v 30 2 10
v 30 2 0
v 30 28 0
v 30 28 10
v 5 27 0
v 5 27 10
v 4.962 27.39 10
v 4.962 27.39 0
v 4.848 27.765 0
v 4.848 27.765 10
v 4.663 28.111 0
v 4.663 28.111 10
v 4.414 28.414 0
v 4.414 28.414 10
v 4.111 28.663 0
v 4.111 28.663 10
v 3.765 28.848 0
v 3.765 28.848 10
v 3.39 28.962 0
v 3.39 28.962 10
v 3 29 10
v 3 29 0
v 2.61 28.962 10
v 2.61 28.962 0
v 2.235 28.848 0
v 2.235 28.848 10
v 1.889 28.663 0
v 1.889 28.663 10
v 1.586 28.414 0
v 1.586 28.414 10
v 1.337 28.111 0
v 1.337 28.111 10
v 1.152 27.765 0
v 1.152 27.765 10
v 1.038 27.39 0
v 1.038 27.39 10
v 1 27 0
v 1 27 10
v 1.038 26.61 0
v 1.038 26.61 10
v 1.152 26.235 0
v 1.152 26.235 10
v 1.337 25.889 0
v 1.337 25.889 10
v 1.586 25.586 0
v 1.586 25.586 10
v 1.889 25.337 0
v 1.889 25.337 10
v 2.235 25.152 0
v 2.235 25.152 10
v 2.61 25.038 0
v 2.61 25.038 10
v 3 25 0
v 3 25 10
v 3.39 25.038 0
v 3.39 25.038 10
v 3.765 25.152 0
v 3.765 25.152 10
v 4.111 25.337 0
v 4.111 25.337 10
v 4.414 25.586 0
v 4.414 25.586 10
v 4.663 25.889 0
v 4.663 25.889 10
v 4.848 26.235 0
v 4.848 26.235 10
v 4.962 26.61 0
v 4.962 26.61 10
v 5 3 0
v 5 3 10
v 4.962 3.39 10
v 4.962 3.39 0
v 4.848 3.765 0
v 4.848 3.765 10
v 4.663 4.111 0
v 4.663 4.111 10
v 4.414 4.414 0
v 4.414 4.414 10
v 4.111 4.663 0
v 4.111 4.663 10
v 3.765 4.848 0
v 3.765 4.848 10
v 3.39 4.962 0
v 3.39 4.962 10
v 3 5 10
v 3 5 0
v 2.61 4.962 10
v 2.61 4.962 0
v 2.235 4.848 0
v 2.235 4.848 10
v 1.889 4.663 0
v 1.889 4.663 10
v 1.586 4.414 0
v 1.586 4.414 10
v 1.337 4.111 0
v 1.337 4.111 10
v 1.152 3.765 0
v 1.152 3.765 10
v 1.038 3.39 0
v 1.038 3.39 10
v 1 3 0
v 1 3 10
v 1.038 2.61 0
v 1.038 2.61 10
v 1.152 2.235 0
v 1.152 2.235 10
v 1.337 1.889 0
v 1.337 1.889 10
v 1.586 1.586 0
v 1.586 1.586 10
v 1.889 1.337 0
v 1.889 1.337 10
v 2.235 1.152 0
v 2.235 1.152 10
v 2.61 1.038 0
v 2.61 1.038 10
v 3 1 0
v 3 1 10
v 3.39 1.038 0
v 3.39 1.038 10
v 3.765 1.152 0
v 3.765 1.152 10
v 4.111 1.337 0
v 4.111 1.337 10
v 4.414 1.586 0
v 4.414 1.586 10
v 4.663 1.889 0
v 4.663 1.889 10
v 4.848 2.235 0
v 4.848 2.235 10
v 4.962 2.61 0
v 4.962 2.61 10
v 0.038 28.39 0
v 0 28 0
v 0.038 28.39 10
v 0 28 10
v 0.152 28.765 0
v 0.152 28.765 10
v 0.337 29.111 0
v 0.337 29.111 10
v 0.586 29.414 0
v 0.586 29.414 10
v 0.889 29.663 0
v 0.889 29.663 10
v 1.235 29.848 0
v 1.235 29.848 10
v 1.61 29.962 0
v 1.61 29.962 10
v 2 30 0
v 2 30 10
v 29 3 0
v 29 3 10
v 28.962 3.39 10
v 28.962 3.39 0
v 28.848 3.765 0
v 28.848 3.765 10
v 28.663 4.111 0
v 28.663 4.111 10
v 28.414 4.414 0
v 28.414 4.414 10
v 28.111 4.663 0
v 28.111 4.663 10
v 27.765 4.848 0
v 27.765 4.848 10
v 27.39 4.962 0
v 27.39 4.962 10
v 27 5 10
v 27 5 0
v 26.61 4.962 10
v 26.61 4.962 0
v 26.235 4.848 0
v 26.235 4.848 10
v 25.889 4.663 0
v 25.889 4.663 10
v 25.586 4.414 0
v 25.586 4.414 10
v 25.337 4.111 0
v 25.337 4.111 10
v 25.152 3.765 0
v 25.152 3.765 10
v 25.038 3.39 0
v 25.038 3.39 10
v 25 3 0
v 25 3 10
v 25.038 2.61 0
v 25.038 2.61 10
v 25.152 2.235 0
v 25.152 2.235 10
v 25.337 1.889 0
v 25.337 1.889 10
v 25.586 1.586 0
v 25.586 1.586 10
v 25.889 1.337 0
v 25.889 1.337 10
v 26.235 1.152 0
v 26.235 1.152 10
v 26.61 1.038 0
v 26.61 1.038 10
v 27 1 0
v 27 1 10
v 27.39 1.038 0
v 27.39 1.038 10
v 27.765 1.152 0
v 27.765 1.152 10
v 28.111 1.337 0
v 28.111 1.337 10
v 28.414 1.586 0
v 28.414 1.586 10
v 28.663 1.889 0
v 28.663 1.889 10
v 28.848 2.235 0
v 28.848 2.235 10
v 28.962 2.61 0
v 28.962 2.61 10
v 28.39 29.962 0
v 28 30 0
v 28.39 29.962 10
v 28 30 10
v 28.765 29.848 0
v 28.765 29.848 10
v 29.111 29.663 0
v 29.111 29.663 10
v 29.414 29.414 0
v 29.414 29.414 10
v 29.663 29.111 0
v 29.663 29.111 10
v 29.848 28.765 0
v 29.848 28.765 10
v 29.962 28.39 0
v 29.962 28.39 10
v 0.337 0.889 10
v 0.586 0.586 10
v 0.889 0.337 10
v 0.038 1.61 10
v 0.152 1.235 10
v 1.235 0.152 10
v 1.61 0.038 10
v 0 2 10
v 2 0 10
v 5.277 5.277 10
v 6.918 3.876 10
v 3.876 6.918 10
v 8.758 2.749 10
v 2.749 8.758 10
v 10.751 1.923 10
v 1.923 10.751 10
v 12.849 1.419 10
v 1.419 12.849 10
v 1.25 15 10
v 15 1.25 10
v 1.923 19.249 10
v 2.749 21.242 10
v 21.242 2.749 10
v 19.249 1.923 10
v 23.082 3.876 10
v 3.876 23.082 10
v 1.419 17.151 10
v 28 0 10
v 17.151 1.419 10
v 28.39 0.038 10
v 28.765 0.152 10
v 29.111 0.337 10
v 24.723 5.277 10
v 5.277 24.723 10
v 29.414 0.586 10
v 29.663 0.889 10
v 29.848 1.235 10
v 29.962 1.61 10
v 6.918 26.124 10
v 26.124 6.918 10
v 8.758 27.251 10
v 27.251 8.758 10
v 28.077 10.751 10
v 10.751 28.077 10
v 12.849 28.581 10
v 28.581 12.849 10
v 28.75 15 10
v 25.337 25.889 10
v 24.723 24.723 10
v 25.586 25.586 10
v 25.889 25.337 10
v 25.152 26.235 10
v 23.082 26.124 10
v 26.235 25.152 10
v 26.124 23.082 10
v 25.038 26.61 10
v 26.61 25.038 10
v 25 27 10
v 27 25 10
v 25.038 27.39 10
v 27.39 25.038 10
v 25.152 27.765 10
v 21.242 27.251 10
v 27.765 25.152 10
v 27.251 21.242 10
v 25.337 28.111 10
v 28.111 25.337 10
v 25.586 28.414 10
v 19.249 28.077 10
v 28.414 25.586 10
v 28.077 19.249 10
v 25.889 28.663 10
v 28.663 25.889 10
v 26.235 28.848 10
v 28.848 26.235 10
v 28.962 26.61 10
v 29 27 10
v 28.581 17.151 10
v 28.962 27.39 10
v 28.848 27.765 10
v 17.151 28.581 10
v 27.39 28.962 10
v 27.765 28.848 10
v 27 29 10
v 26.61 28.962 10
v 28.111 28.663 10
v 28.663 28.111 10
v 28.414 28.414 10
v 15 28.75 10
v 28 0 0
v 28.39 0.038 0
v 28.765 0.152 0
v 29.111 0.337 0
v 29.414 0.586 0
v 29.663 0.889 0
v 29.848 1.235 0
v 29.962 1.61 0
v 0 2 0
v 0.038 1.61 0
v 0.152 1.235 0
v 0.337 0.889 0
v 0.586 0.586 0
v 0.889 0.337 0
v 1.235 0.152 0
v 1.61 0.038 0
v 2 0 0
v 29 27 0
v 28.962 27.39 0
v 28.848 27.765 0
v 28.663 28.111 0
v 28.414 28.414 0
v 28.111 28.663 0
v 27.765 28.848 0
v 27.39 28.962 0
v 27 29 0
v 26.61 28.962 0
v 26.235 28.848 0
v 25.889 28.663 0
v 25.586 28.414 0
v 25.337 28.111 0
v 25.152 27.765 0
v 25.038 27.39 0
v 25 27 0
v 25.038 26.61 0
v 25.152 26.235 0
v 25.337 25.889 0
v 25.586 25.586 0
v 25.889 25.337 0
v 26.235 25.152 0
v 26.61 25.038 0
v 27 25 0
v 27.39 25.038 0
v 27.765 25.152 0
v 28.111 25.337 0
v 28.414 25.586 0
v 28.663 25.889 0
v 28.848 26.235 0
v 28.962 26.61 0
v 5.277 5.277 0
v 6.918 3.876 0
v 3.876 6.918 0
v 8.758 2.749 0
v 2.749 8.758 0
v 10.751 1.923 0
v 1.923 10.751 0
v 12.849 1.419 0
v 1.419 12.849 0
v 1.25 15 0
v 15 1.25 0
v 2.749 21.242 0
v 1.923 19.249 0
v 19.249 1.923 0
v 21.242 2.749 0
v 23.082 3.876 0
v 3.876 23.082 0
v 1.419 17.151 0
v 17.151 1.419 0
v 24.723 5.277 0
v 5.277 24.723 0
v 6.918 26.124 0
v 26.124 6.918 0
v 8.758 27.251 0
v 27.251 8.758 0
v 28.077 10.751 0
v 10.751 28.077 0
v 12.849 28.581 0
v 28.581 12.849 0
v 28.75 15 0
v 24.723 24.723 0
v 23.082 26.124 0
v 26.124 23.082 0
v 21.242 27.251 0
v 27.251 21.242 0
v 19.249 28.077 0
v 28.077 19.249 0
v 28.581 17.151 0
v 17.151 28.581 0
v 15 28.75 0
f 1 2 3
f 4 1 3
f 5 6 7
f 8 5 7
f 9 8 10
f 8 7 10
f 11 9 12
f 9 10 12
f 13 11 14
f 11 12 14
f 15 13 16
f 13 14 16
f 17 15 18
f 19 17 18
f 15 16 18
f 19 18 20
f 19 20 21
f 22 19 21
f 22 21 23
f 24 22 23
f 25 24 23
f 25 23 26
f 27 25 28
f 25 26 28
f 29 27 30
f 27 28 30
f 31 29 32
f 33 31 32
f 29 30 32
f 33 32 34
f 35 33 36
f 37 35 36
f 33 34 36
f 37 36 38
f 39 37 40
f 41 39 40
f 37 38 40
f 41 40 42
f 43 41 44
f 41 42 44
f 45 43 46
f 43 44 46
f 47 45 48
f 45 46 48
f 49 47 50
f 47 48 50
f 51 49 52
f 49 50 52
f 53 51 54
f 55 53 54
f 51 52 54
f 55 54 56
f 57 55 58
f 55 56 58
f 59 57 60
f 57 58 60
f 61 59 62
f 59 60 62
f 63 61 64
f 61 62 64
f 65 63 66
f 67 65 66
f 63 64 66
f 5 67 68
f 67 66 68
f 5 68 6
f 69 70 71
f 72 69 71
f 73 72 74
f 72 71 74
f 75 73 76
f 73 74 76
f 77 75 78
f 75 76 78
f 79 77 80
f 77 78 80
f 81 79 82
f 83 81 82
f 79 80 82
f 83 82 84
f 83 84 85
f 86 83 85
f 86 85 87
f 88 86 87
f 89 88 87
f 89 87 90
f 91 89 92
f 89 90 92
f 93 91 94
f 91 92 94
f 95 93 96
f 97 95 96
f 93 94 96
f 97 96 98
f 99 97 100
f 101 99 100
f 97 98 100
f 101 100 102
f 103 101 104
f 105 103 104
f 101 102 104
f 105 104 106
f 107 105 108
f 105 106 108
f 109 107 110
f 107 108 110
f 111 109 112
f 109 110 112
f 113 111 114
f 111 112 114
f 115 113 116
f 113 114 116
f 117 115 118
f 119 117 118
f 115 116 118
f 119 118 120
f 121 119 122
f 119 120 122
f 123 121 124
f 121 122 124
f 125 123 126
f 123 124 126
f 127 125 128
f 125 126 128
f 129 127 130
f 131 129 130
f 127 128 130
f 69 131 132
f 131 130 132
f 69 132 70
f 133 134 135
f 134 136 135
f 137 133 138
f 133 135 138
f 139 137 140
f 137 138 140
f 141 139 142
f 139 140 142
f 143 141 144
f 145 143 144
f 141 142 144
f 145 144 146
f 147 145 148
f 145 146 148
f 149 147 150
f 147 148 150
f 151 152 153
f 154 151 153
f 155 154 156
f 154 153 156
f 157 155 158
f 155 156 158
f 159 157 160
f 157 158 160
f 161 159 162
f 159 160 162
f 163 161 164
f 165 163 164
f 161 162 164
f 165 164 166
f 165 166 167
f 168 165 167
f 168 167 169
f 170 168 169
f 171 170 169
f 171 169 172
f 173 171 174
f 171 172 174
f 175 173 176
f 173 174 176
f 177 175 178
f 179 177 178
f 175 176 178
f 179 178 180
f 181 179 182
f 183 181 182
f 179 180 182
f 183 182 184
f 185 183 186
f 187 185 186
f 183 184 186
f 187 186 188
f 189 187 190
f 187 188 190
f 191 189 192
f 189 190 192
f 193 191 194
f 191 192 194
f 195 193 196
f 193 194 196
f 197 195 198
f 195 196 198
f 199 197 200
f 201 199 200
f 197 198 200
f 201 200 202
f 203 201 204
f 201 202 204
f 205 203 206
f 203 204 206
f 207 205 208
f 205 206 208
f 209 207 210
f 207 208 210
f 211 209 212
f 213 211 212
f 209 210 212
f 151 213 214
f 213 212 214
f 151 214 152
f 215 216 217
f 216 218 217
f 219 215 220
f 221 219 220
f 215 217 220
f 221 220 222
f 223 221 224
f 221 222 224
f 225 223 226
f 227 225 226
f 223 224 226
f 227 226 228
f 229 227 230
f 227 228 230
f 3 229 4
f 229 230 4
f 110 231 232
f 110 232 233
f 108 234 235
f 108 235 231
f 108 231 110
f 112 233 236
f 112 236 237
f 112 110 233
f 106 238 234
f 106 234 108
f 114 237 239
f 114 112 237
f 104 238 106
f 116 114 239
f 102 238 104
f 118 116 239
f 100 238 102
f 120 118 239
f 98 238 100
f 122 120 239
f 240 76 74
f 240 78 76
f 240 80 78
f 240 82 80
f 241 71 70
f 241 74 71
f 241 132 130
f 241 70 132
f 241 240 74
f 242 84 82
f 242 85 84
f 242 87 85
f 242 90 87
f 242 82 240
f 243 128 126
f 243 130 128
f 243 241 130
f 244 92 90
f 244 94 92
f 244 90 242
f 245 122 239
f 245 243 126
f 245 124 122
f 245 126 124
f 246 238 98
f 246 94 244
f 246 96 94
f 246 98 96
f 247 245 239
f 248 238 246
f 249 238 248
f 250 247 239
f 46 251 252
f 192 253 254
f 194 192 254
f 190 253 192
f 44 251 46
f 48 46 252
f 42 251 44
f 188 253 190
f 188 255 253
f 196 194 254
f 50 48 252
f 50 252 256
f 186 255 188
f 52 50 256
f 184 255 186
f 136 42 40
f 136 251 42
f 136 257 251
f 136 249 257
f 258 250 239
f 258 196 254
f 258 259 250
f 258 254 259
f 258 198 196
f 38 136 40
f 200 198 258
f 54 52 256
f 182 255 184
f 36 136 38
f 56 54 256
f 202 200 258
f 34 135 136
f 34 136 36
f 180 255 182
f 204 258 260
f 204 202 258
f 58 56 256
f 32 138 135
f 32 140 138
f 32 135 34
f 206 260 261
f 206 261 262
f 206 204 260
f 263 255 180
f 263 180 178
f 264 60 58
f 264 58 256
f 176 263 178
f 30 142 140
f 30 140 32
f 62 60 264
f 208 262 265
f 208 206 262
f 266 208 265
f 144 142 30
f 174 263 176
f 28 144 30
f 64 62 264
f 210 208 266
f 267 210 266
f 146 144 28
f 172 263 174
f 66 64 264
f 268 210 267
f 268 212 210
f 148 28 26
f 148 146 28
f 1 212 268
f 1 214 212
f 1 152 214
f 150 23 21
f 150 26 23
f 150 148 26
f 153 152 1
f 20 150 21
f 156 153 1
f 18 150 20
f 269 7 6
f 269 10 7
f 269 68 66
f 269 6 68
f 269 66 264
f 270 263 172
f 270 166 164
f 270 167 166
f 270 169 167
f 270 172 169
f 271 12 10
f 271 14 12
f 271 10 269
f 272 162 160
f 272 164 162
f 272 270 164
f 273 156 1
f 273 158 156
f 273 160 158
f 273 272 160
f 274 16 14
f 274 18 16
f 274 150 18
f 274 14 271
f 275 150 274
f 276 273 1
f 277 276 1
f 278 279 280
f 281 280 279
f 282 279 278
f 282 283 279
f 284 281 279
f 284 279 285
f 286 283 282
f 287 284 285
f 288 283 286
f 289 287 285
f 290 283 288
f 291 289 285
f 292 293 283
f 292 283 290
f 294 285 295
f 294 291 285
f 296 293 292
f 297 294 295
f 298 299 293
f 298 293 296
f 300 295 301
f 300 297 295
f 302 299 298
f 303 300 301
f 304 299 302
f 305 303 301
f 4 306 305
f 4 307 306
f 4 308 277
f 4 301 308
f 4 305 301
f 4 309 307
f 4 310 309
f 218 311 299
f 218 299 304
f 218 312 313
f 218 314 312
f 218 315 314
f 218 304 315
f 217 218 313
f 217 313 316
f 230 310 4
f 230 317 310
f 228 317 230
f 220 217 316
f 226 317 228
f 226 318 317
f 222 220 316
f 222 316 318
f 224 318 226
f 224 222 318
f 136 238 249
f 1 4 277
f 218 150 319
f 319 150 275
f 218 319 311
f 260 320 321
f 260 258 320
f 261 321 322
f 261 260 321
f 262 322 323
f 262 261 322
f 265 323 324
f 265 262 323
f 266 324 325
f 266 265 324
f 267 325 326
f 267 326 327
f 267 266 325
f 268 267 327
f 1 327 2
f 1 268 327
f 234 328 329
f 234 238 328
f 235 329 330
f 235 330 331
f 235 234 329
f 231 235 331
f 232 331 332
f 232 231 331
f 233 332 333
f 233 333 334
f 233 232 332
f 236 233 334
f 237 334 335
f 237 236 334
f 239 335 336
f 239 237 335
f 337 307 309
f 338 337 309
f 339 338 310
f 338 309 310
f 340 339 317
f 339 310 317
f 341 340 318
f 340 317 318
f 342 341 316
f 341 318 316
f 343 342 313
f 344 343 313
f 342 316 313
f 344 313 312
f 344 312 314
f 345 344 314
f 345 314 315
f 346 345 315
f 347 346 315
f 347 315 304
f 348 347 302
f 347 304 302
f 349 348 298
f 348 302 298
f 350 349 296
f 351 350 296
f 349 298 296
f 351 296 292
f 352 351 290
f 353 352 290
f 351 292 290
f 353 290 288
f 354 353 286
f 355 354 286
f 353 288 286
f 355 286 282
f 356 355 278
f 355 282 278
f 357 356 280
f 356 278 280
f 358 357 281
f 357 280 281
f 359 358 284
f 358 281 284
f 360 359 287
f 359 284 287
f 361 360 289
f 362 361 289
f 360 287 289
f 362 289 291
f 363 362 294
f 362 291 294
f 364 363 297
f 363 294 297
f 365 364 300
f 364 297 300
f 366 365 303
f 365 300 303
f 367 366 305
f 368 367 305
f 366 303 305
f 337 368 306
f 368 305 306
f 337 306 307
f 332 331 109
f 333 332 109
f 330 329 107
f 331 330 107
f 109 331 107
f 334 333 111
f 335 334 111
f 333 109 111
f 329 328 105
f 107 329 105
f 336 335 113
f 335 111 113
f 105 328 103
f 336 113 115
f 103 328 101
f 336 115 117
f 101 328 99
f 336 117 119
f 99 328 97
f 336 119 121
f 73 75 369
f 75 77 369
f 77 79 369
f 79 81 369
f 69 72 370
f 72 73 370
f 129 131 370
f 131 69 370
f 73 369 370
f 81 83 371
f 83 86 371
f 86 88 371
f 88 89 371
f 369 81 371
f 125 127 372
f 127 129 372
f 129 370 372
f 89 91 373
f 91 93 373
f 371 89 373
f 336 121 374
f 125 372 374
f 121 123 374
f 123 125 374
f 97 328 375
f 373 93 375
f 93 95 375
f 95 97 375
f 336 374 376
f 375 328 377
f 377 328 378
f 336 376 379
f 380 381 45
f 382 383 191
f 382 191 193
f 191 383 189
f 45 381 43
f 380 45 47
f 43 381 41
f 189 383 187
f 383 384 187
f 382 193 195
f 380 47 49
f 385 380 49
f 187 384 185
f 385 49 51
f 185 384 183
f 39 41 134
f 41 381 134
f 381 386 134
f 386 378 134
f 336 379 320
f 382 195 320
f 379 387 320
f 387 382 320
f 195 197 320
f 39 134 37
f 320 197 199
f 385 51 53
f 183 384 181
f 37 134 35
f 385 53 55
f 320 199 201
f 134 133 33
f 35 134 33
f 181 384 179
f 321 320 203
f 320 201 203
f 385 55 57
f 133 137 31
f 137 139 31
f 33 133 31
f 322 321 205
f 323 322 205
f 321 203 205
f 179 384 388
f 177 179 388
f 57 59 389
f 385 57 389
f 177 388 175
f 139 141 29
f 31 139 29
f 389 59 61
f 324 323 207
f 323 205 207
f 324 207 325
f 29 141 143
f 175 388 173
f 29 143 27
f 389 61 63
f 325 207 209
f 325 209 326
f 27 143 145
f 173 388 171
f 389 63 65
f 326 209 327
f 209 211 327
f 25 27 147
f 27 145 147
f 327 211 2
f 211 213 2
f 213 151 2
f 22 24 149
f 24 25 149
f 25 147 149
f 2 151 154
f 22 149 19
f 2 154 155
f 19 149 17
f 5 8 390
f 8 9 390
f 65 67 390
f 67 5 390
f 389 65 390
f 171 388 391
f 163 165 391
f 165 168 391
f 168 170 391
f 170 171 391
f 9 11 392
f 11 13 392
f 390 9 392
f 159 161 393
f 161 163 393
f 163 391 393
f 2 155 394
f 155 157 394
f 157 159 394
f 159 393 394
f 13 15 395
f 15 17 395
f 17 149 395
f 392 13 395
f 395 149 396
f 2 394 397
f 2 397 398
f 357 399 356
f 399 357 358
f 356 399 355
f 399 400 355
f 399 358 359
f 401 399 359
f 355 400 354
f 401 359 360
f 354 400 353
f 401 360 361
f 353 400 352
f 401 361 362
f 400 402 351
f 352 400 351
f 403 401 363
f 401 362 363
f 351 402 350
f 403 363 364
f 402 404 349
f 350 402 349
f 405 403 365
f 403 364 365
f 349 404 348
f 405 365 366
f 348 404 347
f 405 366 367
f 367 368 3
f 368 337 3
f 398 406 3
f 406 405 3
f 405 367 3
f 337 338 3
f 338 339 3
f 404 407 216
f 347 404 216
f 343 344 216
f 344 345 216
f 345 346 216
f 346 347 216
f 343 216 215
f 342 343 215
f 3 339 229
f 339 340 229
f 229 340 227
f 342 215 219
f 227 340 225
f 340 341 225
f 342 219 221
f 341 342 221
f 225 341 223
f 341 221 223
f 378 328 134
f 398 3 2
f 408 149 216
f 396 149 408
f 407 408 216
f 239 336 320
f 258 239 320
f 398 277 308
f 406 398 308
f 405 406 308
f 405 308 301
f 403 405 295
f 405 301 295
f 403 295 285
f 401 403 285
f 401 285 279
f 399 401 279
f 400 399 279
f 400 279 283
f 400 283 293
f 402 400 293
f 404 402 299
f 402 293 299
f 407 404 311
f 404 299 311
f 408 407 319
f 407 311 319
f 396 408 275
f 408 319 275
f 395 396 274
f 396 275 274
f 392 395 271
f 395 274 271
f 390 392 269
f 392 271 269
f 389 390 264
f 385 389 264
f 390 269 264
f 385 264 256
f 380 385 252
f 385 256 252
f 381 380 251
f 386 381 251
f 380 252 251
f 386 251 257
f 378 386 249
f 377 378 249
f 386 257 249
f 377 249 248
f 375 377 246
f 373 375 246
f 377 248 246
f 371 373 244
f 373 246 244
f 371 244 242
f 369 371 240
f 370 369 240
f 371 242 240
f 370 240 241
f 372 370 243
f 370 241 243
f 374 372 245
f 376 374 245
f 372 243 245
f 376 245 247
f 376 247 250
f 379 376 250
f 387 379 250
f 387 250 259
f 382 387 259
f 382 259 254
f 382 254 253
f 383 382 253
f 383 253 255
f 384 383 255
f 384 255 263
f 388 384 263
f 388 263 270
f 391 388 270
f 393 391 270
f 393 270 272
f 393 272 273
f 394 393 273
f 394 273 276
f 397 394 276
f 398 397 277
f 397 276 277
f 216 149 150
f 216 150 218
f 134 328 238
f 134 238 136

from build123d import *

# Parameters (mm, degrees)
SKETCH1_W           = 30
SKETCH1_H           = 30
BOSS_EXTRUDE1_DEPTH = 10
SKETCH3_R           = 13.75
SKETCH3_R_2         = 2
CUT_EXTRUDE1_DEPTH  = 10
FILLET1_R           = 2


with BuildPart() as part:
    # Sketch1 → Boss-Extrude1 (new body)
    with BuildSketch(Plane.XY):
        with Locations((15, 15)):
            Rectangle(SKETCH1_W, SKETCH1_H)
    extrude(amount=BOSS_EXTRUDE1_DEPTH)

    # Sketch3 → Cut-Extrude1 (cut)
    with BuildSketch(Plane.XY.offset(10)):
        with Locations((15, 15)):
            Circle(SKETCH3_R)
        with Locations((3, 27)):
            Circle(SKETCH3_R_2)
        with Locations((3, 3)):
            Circle(SKETCH3_R_2)
        with Locations((27, 3)):
            Circle(SKETCH3_R_2)
        with Locations((27, 27)):
            Circle(SKETCH3_R_2)
    extrude(amount=-CUT_EXTRUDE1_DEPTH, mode=Mode.SUBTRACT)

    # Fillet1
    fillet1_edges = [part.edges().sort_by_distance(p)[0] for p in [
        (0, 30, 5),
        (30, 30, 5),
        (30, 0, 5),
        (0, 0, 5),
    ]]
    fillet(fillet1_edges, radius=FILLET1_R)


solid = part.part
